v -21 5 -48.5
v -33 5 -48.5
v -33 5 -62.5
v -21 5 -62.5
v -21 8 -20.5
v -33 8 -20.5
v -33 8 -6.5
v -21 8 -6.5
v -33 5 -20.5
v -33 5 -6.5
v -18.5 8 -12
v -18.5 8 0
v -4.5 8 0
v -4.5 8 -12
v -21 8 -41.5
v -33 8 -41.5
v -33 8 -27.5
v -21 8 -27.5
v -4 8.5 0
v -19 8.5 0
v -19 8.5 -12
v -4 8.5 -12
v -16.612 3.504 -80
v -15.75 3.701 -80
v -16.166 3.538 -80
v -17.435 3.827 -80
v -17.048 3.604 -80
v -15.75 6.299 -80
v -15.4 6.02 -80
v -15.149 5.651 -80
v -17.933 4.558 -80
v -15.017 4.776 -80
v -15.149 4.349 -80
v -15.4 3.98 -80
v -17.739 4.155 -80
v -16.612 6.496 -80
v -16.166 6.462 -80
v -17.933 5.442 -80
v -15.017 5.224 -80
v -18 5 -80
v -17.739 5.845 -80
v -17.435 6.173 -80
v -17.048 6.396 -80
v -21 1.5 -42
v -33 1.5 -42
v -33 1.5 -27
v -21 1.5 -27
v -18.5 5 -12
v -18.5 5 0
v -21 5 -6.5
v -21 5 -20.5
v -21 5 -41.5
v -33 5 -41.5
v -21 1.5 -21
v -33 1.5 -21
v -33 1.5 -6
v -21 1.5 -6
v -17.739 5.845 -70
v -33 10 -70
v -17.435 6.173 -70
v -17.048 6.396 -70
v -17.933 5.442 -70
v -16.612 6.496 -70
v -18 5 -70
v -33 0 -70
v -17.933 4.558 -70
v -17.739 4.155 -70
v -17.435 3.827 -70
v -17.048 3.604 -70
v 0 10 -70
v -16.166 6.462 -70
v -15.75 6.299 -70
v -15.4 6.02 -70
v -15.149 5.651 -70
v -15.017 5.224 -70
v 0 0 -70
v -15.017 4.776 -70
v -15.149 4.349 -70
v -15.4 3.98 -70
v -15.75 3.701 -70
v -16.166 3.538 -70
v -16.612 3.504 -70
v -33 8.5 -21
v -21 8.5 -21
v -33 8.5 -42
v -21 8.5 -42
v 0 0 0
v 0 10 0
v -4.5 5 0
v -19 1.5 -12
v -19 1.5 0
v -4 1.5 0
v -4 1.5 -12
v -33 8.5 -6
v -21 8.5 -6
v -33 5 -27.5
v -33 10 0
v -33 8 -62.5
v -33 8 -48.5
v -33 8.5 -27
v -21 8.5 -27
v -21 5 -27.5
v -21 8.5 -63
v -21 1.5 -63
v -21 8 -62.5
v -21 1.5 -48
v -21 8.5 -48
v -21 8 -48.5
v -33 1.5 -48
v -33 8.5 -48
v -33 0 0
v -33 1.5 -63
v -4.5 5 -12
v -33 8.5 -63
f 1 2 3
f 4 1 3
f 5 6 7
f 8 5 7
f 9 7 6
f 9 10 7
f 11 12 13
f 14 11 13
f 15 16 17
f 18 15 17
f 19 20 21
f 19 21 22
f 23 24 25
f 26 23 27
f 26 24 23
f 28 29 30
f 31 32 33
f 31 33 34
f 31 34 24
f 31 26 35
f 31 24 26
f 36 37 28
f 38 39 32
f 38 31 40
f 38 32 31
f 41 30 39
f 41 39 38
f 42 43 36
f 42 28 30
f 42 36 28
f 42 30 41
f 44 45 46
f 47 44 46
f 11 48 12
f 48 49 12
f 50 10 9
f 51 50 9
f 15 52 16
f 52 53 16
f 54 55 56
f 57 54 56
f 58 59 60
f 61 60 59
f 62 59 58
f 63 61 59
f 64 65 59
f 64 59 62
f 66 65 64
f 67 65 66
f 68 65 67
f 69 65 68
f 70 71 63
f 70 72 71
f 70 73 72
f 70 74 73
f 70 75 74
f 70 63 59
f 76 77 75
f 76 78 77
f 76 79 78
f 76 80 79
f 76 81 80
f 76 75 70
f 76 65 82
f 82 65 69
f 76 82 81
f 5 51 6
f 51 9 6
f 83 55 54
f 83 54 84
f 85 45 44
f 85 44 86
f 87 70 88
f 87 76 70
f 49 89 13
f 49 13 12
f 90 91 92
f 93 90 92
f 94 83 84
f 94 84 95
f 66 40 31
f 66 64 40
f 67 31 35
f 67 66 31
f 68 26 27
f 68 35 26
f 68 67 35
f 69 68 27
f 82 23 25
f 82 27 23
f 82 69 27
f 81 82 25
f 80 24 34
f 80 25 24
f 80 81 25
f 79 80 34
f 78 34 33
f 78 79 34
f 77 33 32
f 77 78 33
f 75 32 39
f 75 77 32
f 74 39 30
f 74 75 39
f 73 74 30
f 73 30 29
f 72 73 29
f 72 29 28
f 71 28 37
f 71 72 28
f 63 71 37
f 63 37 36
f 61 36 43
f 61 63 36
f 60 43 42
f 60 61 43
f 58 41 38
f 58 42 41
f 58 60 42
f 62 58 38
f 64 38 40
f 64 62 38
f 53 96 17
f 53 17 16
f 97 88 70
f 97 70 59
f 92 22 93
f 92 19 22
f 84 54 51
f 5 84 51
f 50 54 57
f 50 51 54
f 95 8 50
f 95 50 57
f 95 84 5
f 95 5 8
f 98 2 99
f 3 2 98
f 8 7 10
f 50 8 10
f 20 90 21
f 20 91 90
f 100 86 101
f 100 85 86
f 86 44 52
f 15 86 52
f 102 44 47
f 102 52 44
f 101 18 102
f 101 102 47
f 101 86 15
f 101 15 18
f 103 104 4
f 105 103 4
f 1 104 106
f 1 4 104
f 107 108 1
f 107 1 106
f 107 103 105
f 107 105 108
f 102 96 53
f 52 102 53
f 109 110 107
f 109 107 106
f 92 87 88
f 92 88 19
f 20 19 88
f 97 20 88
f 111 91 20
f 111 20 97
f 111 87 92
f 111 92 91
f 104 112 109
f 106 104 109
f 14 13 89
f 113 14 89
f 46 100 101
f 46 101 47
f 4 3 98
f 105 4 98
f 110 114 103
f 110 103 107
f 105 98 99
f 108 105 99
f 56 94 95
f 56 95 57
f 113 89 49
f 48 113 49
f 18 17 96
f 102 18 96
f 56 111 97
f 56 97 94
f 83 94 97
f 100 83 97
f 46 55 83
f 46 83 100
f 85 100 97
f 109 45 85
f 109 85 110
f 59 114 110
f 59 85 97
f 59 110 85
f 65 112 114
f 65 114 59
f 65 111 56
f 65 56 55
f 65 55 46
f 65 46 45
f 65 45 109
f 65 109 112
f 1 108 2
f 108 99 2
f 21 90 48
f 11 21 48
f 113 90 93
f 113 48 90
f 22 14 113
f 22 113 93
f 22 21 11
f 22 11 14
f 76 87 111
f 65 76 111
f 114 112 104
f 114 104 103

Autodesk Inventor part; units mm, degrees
ref_plane "YZ Plane" through (0, 0, 0) normal (1, 0, 0) x (0, 1, 0)
ref_plane "XZ Plane" through (0, 0, 0) normal (0, 1, 0) x (-1, 0, 0)
ref_plane "XY Plane" through (0, 0, 0) normal (0, 0, 1) x (1, 0, 0)
sketch "Sketch1" plane through (0, 0, 0) normal (0, 1, 0) x (-1, 0, 0)
  line L0 (0, 0) -> (33, 0)
  line L1 (33, 0) -> (33, -70)
  line L2 (33, -70) -> (0, -70)
  line L3 (0, -70) -> (0, 0)
  dimension "d0" = 70
  dimension "d1" = 33
extrude "Extrusion1" add sketch "Sketch1" along normal blind 10
sketch "Sketch2" plane through (-33, 0, 0) normal (0, 0, 1) x (1, 0, 0)
  line L0 (14, 1.5) -> (29, 1.5)
  line L1 (14, 1.5) -> (14, 8.5)
  line L2 (14, 8.5) -> (29, 8.5)
  line L3 (29, 8.5) -> (29, 1.5)
  line L4 (14.5, 8) -> (28.5, 8)
  line L5 (28.5, 8) -> (28.5, 5)
  line L6 (28.5, 5) -> (14.5, 5)
  line L7 (14.5, 5) -> (14.5, 8)
  line L8 (33, 0) -> (33, 10) projected
  line L9 (33, 0) -> (0, 0) projected
  point P0 (21.5, 1.5)
  point P1 (30, -14)
  point P2 (21.5, 5)
  point P3 (30, -14)
  point P4 (30, -14)
  dimension "d4" = 15
  dimension "d5" = 7
  dimension "d6" = 14
  dimension "d7" = 3
  dimension "d8" = 0.5
  dimension "d9" = 0.5
  dimension "d22" = 4
  dimension "d23" = 1.5
extrude "Extrusion2" cut sketch "Sketch2" against normal blind 12
sketch "Sketch3" plane through (-33, 0, -70) normal (-1, 0, 0) x (0, 0, 1)
  line L0 (7, 1.5) -> (22, 1.5)
  line L1 (7, 1.5) -> (7, 8.5)
  line L2 (7, 8.5) -> (22, 8.5)
  line L3 (22, 8.5) -> (22, 1.5)
  line L4 (7.5, 8) -> (21.5, 8)
  line L5 (21.5, 8) -> (21.5, 5)
  line L6 (21.5, 5) -> (7.5, 5)
  line L7 (7.5, 5) -> (7.5, 8)
  line L8 (0, 0) -> (0, 10) projected
  line L9 (70, 0) -> (0, 0) projected
  line L10 (14.5, 8.5) -> (14.5, 1.5) construction
  line L11 (28, 1.5) -> (28, 8.5)
  line L12 (28.5, 5) -> (28.5, 8)
  line L13 (28.5, 8) -> (42.5, 8)
  line L14 (42.5, 8) -> (42.5, 5)
  line L15 (42.5, 5) -> (28.5, 5)
  line L16 (28, 1.5) -> (43, 1.5)
  line L17 (28, 8.5) -> (43, 8.5)
  line L18 (43, 8.5) -> (43, 1.5)
  line L19 (35.5, 8.5) -> (35.5, 1.5) construction
  line L20 (49, 1.5) -> (49, 8.5)
  line L21 (49.5, 5) -> (49.5, 8)
  line L22 (49.5, 8) -> (63.5, 8)
  line L23 (63.5, 8) -> (63.5, 5)
  line L24 (63.5, 5) -> (49.5, 5)
  line L25 (49, 1.5) -> (64, 1.5)
  line L26 (49, 8.5) -> (64, 8.5)
  line L27 (64, 8.5) -> (64, 1.5)
  line L28 (56.5, 8.5) -> (56.5, 1.5) construction
  point P0 (14.5, 5)
  point P1 (35.5, 5)
  point P2 (56.5, 5)
  dimension "d26" = 15
  dimension "d27" = 7
  dimension "d28" = 14
  dimension "d29" = 3
  dimension "d30" = 0.5
  dimension "d31" = 0.5
  dimension "d32" = 7
  dimension "d33" = 1.5
  dimension "d36" = 21
extrude "Extrusion3" cut sketch "Sketch3" against normal blind 12
sketch "Sketch4" plane through (0, 0, -70) normal (0, 0, -1) x (-1, 0, 0)
  circle A0 centre (16.5, 5) radius 1.5
  line L0 (33, 0) -> (0, 0) projected
  line L1 (0, 10) -> (33, 10) projected
  line L2 (0, 0) -> (0, 10) projected
  line L3 (33, 0) -> (33, 10) projected
  dimension "d43" = 3
  dimension "d44" = 10
  dimension "d45" = 33
  dimension "d46" = 5
  dimension "d47" = 16.5
extrude "Extrusion4" add sketch "Sketch4" along normal blind 10 contours A0
sketch "Sketch5" plane through (-16.5, 5, -80) normal (0, 0, -1) x (-1, 0, 0)
  circle A0 centre (0, 0) radius 1.5 projected
  point P0 (-16.5, -5)
equation "\"d46\" = 0.5 * d44"
equation "\"d47\" = 0.5 * d45"
properties part number "usbHubSmall"
